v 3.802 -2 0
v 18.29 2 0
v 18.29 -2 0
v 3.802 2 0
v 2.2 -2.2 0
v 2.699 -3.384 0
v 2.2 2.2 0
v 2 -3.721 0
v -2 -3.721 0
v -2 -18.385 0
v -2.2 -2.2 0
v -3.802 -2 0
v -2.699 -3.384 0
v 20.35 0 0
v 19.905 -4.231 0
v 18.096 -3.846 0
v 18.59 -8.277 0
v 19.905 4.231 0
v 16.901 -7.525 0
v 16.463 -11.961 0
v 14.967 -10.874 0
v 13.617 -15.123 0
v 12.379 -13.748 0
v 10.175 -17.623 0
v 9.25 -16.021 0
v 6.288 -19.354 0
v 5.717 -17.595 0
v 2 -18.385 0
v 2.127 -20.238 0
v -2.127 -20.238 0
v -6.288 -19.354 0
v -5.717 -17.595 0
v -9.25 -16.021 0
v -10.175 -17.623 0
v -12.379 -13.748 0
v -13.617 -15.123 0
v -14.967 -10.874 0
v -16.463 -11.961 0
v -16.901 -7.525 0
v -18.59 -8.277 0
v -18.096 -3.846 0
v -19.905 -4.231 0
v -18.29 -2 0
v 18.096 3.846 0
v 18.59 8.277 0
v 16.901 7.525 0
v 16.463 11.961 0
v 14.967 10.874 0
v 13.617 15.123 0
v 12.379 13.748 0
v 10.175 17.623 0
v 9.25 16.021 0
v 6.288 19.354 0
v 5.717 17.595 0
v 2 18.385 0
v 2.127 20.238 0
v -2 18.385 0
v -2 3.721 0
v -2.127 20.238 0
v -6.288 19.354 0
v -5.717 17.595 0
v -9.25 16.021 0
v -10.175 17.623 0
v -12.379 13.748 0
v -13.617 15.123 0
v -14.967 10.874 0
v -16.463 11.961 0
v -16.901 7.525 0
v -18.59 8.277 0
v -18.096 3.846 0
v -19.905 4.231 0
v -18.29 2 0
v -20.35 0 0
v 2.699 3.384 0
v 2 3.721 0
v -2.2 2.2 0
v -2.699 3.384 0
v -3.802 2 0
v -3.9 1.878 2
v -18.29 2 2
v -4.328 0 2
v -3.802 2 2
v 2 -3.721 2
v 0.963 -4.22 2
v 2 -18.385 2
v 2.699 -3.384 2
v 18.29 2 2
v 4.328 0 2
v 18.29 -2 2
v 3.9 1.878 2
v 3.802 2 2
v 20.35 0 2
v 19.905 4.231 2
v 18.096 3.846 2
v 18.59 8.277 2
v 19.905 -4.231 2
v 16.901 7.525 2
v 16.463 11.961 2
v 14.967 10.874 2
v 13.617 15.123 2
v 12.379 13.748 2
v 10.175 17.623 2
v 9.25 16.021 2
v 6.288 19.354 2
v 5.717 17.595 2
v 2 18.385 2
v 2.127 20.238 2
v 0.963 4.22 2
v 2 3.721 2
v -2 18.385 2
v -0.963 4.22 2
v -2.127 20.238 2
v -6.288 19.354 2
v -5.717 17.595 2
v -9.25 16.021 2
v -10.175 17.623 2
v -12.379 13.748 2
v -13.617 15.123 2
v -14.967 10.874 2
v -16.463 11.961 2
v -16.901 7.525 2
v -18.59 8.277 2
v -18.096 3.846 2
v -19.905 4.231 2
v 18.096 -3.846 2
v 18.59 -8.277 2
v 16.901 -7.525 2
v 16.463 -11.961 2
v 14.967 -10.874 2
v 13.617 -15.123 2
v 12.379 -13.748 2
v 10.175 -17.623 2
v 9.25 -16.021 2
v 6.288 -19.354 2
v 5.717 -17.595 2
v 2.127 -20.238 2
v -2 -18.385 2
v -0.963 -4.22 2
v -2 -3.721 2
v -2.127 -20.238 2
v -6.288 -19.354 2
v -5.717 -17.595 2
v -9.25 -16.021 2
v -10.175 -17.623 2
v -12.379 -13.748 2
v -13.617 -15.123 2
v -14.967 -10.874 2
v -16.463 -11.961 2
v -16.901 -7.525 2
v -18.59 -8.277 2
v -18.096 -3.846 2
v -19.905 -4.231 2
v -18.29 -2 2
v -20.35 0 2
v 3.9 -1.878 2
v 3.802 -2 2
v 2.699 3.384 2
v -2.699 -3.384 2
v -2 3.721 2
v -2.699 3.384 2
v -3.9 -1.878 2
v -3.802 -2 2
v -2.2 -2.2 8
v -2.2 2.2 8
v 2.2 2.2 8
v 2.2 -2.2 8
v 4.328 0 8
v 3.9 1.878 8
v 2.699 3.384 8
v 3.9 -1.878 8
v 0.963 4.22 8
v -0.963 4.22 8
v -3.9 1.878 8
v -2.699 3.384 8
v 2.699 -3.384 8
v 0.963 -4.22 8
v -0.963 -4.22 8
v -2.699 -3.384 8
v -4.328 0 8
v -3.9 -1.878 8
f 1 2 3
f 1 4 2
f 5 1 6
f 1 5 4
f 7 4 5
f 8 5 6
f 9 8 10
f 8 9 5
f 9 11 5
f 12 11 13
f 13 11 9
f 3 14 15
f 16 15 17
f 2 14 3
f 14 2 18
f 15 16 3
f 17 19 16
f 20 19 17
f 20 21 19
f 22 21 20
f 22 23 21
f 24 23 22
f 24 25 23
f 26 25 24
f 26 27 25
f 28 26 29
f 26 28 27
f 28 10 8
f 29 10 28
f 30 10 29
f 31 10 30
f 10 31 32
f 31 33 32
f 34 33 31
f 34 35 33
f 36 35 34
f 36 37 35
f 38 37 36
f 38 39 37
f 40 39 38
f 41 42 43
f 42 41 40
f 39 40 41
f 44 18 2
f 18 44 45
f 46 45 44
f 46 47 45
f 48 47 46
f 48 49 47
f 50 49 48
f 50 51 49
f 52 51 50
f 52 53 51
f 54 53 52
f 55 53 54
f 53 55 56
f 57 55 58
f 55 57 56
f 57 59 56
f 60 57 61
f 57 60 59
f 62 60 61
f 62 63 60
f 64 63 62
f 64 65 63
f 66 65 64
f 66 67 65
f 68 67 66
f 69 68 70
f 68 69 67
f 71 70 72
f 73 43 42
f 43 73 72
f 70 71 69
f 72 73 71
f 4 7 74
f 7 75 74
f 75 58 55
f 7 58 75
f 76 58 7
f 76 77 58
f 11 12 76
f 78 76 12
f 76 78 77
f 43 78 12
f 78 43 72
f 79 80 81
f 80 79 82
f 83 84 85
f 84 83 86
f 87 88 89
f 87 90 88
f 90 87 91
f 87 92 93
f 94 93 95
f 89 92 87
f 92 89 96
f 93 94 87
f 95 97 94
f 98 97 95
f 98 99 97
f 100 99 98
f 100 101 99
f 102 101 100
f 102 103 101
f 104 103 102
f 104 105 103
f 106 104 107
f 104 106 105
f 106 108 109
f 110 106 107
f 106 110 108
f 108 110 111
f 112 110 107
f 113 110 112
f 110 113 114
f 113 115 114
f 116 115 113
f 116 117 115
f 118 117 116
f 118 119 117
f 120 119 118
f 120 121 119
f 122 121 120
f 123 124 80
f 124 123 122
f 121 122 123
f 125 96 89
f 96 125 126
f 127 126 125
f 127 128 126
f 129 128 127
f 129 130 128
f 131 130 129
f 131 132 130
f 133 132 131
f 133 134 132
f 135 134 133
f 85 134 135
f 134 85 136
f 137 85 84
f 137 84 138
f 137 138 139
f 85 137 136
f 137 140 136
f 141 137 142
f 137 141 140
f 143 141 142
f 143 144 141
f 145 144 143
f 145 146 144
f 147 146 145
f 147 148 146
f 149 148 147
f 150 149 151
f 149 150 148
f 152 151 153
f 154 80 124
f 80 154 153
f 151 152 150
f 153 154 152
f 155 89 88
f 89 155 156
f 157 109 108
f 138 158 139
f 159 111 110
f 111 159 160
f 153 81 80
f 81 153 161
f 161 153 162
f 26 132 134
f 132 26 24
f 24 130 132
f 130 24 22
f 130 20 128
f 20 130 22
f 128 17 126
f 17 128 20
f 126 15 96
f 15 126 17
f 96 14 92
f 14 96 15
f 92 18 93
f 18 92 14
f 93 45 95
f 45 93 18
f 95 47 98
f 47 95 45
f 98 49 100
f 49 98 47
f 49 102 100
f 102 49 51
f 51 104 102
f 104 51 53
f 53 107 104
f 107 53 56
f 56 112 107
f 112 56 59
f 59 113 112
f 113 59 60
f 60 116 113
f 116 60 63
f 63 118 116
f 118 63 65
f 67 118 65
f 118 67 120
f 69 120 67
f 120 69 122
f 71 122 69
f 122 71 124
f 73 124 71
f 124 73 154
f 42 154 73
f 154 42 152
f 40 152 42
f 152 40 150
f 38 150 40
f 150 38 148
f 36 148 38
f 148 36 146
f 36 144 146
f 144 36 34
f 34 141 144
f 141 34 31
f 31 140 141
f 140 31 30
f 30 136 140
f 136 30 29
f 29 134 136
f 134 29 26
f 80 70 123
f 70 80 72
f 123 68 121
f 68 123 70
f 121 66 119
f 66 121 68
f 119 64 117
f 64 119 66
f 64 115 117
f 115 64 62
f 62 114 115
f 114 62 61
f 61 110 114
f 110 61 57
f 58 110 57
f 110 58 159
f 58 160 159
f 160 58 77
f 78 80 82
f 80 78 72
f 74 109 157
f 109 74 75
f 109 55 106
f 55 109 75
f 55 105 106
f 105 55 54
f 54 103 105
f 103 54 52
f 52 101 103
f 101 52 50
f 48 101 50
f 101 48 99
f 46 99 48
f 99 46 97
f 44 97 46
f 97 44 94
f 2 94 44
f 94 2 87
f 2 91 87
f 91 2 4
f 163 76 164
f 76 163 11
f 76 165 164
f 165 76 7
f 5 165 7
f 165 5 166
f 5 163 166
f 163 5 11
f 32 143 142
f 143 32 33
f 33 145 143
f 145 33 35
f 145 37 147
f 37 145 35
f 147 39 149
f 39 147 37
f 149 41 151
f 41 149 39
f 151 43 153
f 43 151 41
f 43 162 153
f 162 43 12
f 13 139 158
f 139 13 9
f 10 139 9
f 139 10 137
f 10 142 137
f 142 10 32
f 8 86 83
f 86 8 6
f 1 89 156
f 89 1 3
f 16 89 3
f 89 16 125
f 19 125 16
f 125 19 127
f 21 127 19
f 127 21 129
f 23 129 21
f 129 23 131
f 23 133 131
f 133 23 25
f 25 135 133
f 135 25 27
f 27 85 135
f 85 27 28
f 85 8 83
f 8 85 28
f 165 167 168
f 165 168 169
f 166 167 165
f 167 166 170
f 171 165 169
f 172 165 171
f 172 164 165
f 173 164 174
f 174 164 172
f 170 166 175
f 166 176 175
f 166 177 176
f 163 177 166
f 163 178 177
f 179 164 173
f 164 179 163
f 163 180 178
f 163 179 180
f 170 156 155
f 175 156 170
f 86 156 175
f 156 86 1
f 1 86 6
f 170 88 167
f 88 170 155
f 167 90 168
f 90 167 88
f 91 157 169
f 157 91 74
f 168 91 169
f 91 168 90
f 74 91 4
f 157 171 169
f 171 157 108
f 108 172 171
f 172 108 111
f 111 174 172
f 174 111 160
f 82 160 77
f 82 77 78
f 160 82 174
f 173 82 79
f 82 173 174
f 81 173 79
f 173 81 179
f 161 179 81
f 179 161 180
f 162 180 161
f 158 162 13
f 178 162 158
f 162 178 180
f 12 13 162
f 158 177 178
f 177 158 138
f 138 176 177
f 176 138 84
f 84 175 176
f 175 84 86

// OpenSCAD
 
// length of the first segment in mm
segment_length = 40; 
// thickness of the first segment (from tree)
thickness = 4; 
// extrusion heigh of the whole tree base
height = 4;
// tolerance for center hole
tolerance = 0.4;
// Settings END //

max =   (thickness < height) ? height : thickness ;

module base(length, thickness) {
        
difference(){
    union(){
        translate ([-thickness/2,-length/2,0])
            square([thickness, length]);
   
        rotate([0,0,90])  
            translate ([-thickness/2,-length/2,0]) 
                square([thickness, length]);
        
        circle(d=sqrt(thickness*thickness+height*height)+3);
    
        difference(){
            circle(d=sqrt(thickness*thickness+length*length)+0.5);
            circle(d=length-3);
        }
    }
    translate ([-(thickness+tolerance)/2,-(height+tolerance)/2,0])
        square([thickness+tolerance, height+tolerance]);
}
}

linear_extrude(height = height/2){
    base(segment_length, thickness);
}
linear_extrude(height = height*2){
    
    difference(){
        circle(d=sqrt(thickness*thickness+height*height)+3);
        translate ([-(thickness+tolerance)/2,-(height+tolerance)/2,0]) 
            square([thickness+tolerance, height+tolerance]);
    }
}
